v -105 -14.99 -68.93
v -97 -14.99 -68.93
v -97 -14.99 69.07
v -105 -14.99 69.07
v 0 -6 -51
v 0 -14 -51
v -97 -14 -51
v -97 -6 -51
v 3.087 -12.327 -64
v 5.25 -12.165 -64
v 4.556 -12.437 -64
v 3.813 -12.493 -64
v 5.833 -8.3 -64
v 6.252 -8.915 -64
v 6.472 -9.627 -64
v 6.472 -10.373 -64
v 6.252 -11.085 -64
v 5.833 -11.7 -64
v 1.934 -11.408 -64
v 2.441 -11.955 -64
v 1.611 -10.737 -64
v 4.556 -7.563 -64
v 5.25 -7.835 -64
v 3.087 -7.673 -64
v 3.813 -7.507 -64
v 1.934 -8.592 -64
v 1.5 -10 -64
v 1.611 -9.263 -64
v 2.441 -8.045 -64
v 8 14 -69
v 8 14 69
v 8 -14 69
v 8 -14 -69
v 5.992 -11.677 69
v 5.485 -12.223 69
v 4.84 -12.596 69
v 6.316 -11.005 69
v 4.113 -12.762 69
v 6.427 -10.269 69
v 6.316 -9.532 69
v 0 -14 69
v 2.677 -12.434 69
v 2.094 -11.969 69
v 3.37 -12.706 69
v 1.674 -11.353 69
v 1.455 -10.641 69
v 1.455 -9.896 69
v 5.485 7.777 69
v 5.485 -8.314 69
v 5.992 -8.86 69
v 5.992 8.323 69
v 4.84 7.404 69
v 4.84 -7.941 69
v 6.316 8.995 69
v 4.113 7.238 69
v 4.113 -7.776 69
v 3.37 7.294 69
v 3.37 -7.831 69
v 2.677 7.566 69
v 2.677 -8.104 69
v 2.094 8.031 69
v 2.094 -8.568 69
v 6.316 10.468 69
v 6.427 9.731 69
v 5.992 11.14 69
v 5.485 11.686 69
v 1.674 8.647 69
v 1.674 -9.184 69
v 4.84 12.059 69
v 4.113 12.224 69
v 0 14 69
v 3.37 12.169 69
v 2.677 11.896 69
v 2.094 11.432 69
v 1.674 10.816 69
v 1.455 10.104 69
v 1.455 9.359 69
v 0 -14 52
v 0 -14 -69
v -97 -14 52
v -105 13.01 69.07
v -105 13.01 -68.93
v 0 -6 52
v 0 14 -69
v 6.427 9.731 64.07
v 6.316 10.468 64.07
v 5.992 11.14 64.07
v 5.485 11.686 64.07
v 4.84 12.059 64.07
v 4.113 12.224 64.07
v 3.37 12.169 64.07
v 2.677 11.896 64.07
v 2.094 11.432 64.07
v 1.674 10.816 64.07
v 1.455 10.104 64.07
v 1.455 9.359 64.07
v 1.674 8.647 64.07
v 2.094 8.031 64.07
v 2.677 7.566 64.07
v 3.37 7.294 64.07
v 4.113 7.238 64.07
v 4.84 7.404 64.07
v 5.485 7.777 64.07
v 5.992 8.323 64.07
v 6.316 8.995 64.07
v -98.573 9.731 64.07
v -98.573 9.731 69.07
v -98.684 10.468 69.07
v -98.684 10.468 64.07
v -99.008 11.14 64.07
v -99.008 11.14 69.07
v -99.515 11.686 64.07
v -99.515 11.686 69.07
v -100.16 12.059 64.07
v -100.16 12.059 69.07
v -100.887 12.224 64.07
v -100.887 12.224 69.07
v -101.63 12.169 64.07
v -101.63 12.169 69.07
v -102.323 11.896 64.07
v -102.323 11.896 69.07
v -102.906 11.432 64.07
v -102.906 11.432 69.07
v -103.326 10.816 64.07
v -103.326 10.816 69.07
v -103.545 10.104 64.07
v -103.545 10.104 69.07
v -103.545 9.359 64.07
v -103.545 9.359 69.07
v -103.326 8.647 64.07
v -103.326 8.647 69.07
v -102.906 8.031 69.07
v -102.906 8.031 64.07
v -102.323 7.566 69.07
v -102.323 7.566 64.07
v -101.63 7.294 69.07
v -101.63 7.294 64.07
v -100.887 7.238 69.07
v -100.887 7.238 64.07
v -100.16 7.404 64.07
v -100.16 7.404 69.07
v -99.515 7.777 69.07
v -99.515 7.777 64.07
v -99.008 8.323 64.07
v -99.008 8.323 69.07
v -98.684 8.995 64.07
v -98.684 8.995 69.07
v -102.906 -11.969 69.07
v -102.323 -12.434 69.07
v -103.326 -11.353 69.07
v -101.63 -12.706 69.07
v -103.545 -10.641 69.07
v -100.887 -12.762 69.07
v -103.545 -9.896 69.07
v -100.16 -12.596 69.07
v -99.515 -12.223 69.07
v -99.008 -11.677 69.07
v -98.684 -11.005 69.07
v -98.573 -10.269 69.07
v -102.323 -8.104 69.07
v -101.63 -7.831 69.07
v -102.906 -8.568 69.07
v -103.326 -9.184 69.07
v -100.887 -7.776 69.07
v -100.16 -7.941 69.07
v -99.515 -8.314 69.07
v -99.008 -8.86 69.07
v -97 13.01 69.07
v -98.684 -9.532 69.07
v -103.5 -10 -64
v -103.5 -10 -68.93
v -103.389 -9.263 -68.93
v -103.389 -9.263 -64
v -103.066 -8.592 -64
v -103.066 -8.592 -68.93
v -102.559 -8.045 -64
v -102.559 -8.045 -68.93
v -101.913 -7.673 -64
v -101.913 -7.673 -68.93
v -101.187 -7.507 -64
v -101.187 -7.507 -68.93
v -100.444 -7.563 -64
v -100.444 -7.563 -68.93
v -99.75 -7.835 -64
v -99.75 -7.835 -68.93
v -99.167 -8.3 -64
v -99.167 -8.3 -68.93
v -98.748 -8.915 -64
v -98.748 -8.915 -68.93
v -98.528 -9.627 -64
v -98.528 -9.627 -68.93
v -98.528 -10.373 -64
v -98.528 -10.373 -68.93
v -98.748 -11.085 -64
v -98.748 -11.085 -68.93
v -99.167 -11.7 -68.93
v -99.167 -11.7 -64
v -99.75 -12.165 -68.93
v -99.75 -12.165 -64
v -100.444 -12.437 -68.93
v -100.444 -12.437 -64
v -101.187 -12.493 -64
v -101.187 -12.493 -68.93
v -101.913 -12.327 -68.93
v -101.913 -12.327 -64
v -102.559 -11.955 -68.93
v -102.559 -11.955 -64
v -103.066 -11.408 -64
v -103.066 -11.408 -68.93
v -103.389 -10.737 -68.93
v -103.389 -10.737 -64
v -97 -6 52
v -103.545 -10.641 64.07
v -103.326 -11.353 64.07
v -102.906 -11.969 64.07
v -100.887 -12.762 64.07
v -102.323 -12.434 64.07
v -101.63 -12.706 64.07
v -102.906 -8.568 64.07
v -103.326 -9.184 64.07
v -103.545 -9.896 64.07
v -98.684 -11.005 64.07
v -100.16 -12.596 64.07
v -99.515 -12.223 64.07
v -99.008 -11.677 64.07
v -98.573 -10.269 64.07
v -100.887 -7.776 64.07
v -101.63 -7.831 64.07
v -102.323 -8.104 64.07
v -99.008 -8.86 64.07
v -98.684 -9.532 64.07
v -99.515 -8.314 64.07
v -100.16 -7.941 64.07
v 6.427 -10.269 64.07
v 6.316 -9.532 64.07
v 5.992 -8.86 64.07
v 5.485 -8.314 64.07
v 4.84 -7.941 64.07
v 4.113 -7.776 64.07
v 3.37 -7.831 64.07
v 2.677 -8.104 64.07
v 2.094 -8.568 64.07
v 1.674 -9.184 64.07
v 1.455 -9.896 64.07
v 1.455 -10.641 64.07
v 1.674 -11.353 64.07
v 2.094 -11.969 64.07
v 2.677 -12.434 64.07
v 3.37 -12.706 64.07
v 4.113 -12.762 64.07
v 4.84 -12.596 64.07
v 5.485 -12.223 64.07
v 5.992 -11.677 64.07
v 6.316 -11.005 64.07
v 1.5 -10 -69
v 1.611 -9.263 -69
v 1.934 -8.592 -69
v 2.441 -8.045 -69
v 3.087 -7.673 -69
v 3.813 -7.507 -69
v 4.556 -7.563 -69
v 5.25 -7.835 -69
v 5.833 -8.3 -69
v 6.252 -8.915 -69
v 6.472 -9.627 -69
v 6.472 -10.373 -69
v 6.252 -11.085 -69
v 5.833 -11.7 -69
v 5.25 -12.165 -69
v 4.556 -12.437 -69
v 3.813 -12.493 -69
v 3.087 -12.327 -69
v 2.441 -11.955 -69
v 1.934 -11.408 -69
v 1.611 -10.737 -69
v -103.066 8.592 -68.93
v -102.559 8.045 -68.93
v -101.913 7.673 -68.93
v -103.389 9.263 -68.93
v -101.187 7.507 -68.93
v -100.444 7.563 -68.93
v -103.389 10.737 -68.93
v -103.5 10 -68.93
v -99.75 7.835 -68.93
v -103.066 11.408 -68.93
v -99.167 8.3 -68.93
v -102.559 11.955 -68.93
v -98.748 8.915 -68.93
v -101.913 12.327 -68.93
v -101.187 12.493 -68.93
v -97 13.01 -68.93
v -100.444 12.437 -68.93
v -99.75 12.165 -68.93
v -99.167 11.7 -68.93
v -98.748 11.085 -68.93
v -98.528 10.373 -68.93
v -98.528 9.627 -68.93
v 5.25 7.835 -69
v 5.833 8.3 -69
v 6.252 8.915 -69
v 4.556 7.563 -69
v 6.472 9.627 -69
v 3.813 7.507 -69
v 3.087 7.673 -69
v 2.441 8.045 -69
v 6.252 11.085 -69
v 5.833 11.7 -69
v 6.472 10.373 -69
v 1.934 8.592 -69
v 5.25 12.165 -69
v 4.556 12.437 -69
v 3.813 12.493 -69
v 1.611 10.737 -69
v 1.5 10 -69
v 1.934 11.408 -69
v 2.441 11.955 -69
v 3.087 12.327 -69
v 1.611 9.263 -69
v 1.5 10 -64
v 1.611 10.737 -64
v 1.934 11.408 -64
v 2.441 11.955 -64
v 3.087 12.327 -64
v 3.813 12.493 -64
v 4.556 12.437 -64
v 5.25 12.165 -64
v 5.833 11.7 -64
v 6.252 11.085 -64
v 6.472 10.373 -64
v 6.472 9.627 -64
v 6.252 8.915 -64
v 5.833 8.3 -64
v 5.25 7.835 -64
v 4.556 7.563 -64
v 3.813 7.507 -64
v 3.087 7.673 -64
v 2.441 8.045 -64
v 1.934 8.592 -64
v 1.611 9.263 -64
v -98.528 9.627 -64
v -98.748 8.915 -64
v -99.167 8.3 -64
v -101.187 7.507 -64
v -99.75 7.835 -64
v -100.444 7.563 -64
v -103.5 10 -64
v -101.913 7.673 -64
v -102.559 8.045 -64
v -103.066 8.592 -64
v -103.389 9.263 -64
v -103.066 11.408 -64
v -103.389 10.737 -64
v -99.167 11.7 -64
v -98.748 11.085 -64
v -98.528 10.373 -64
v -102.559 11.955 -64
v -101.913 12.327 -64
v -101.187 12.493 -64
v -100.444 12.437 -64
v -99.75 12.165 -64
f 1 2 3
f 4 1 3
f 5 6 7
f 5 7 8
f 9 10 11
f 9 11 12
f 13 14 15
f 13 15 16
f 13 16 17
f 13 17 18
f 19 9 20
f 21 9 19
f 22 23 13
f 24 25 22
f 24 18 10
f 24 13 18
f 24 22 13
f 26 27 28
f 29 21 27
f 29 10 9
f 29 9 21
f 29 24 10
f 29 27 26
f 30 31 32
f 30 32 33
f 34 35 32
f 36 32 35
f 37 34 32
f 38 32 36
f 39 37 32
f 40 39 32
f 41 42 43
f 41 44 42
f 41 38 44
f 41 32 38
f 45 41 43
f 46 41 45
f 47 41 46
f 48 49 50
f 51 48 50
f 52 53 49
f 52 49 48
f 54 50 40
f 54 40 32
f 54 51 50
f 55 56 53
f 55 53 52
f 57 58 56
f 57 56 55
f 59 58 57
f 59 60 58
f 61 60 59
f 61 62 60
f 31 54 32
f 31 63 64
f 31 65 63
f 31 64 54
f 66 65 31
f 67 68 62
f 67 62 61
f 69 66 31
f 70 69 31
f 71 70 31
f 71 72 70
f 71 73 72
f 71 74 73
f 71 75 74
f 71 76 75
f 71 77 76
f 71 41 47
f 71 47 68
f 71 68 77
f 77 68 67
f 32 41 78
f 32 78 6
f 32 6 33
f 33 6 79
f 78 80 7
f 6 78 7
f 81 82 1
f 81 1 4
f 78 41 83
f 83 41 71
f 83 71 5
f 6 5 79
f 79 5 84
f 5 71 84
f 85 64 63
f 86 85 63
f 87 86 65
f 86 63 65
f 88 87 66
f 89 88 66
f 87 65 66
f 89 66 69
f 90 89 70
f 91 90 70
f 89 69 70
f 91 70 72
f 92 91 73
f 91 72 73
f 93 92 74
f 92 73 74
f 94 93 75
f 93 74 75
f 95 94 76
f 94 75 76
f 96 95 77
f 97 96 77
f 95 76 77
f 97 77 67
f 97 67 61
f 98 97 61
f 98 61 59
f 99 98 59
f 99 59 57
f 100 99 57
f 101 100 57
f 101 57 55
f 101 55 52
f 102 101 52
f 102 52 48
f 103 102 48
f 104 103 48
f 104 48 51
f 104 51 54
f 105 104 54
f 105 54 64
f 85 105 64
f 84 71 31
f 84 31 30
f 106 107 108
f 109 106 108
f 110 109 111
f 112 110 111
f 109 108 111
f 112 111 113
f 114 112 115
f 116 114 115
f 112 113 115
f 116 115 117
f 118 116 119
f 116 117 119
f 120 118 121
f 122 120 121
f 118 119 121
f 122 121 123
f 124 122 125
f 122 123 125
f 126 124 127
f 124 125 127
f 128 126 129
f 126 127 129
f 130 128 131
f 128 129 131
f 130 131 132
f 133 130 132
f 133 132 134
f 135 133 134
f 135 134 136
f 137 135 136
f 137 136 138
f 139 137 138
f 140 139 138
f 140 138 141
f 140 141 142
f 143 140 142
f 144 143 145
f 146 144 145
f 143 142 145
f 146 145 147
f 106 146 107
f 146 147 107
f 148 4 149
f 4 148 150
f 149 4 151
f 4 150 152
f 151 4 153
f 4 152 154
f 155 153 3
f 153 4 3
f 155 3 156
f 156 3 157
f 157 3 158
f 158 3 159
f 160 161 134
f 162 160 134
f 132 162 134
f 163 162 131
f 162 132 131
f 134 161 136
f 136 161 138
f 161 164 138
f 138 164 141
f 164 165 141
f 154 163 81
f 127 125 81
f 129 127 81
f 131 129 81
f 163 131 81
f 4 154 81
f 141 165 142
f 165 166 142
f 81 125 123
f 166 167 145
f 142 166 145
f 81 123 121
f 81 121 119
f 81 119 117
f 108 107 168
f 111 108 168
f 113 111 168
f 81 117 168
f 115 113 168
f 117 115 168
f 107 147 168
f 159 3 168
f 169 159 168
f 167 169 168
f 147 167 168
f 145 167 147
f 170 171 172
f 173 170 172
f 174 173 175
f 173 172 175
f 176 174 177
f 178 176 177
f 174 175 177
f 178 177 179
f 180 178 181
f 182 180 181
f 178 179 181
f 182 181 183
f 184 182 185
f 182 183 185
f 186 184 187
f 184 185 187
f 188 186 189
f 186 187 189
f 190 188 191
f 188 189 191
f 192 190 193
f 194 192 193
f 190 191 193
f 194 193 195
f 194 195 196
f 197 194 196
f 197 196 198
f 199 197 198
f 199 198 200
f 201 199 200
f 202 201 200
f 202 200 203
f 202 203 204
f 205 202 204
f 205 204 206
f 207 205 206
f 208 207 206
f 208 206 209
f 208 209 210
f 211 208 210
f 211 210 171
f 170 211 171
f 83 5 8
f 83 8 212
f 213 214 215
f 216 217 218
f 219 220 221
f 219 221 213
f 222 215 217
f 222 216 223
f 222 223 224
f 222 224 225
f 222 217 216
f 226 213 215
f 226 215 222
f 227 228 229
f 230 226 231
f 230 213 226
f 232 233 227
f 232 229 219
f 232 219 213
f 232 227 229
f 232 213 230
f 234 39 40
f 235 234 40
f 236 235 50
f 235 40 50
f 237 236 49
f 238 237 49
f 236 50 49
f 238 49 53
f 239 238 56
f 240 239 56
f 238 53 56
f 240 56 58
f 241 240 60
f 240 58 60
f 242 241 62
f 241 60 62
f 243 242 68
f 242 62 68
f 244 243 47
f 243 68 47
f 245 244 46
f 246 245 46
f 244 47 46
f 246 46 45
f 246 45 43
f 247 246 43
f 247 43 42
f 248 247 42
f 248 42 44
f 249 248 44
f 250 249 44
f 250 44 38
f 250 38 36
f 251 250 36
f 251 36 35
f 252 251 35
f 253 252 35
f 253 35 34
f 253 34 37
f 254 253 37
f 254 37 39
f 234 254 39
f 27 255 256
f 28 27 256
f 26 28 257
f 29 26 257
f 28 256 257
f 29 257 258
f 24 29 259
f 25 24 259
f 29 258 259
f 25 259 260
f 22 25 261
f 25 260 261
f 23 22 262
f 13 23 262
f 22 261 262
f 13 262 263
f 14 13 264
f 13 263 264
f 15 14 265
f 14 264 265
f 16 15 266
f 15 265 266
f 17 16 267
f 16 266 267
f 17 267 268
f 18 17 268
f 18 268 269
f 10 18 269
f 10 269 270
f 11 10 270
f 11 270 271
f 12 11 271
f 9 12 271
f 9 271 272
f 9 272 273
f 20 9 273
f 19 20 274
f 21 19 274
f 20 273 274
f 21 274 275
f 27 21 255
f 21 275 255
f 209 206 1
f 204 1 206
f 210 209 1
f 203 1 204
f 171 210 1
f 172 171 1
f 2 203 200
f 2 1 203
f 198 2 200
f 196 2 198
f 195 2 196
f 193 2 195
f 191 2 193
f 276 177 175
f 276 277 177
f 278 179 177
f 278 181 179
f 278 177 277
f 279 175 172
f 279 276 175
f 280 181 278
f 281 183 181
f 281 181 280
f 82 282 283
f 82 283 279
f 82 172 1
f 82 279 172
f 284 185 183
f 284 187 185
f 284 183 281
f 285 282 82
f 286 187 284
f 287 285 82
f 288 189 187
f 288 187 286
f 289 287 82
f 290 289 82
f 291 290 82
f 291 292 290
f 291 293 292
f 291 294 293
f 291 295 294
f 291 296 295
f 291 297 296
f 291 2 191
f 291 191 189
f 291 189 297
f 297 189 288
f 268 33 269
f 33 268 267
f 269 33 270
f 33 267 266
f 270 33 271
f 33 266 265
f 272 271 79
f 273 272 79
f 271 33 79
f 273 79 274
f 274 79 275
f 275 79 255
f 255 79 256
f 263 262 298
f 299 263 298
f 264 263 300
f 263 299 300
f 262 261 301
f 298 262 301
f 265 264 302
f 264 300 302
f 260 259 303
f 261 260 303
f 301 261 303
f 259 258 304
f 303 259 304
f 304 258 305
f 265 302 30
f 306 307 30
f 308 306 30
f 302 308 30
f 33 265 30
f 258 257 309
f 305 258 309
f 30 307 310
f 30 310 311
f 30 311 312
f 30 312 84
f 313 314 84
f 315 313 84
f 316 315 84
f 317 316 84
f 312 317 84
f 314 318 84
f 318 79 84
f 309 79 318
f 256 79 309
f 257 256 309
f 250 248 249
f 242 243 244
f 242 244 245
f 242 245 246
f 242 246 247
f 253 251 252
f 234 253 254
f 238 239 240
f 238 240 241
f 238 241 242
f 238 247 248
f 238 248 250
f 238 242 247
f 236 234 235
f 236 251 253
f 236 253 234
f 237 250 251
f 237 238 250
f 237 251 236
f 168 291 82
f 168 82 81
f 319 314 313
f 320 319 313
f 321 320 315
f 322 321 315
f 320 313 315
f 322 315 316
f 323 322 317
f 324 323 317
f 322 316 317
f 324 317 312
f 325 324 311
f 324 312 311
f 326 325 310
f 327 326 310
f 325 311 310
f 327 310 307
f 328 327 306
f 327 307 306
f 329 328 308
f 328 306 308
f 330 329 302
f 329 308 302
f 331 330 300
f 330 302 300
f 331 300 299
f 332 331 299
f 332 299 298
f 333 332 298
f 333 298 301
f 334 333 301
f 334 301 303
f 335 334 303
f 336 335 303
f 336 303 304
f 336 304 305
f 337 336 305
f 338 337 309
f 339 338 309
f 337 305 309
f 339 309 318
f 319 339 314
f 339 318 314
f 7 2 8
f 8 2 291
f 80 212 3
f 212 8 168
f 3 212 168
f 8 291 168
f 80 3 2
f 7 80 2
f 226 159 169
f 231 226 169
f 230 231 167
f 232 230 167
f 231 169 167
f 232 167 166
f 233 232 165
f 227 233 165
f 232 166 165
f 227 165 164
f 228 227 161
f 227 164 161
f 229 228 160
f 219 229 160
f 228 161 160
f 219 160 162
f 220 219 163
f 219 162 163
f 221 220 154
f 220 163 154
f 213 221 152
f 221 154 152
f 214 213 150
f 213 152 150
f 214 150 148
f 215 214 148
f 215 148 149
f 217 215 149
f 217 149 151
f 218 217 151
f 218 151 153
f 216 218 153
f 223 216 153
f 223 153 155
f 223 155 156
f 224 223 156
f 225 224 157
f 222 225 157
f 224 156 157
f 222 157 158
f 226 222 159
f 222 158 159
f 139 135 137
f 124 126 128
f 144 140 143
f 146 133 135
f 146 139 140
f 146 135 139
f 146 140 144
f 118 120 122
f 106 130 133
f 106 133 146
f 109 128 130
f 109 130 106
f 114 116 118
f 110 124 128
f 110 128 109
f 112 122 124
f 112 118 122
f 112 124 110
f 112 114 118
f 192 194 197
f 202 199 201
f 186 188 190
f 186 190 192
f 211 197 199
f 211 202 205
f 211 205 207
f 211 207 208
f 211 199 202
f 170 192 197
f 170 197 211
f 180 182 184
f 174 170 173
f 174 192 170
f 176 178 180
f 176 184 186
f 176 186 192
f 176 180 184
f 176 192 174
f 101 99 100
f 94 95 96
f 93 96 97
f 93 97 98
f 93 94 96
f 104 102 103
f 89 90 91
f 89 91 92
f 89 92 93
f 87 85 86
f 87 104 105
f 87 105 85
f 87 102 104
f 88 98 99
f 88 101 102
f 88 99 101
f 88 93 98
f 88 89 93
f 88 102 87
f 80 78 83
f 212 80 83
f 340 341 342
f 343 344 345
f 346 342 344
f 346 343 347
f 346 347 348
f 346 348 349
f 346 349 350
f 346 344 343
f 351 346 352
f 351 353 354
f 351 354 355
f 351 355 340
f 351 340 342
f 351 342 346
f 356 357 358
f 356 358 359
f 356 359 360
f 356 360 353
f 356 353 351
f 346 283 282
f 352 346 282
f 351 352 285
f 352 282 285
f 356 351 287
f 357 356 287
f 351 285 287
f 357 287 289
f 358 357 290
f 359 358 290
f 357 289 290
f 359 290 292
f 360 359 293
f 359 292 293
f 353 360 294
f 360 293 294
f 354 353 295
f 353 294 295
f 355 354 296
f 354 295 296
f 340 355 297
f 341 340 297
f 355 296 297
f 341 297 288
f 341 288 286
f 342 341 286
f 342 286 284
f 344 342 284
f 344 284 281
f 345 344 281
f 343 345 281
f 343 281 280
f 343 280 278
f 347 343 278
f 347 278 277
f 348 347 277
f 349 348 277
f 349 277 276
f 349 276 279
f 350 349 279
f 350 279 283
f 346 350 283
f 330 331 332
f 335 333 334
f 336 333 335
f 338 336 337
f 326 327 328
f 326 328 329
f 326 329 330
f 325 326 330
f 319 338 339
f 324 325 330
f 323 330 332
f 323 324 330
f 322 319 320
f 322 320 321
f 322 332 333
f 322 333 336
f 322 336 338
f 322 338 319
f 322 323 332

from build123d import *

# Parameters (mm, degrees)
SKETCH_1_W          = 138
SKETCH_1_H          = 28
EXTRUDE_1_DEPTH     = 8
SKETCH_2_W          = 103
SKETCH_2_H          = 8
EXTRUDE_2_DEPTH     = 97
SKETCH_3_W          = 138
SKETCH_3_H          = 28
EXTRUDE_3_DEPTH     = 8
SKETCH_4_R          = 2.5
CUT_EXTRUDE_1_DEPTH = 5
SKETCH_5_R          = 2.5
CUT_EXTRUDE_2_DEPTH = 5


with BuildPart() as part:
    # 草图1 → 凸台-拉伸1 (new body)
    with BuildSketch(Plane(origin=(0, 0, 0), x_dir=(0, 0, -1), z_dir=(1, 0, 0))):
        Rectangle(SKETCH_1_W, SKETCH_1_H)
    extrude(amount=EXTRUDE_1_DEPTH)

    # 草图2 → 凸台-拉伸2 (add)
    with BuildSketch(Plane.ZY):
        with Locations((0.5, -10)):
            Rectangle(SKETCH_2_W, SKETCH_2_H)
    extrude(amount=EXTRUDE_2_DEPTH)

    # 草图3 → 凸台-拉伸3 (add)
    with BuildSketch(Plane.ZY.offset(97)):
        with Locations((0.070183463, -0.989678925)):
            Rectangle(SKETCH_3_W, SKETCH_3_H)
    extrude(amount=EXTRUDE_3_DEPTH)

    # 草图4 → 切除-拉伸1 (cut)
    with BuildSketch(Plane.XY.offset(69.070183463)):
        with Locations((-101.073349409, 9.731398078)):
            Circle(SKETCH_4_R)
        with Locations((3.926650591, 9.731398078)):
            Circle(SKETCH_4_R)
        with Locations((3.926650591, -10.268601922)):
            Circle(SKETCH_4_R)
        with Locations((-101.073349409, -10.268601922)):
            Circle(SKETCH_4_R)
    extrude(amount=-CUT_EXTRUDE_1_DEPTH, mode=Mode.SUBTRACT)

    # 草图5 → 切除-拉伸2 (cut)
    with BuildSketch(Plane(origin=(0, 0, -69), x_dir=(-1, 0, 0), z_dir=(0, 0, -1))):
        with Locations((-4, 10)):
            Circle(SKETCH_5_R)
        with Locations((101, 10)):
            Circle(SKETCH_5_R)
        with Locations((101, -10)):
            Circle(SKETCH_5_R)
        with Locations((-4, -10)):
            Circle(SKETCH_5_R)
    extrude(amount=-CUT_EXTRUDE_2_DEPTH, mode=Mode.SUBTRACT)


solid = part.part
